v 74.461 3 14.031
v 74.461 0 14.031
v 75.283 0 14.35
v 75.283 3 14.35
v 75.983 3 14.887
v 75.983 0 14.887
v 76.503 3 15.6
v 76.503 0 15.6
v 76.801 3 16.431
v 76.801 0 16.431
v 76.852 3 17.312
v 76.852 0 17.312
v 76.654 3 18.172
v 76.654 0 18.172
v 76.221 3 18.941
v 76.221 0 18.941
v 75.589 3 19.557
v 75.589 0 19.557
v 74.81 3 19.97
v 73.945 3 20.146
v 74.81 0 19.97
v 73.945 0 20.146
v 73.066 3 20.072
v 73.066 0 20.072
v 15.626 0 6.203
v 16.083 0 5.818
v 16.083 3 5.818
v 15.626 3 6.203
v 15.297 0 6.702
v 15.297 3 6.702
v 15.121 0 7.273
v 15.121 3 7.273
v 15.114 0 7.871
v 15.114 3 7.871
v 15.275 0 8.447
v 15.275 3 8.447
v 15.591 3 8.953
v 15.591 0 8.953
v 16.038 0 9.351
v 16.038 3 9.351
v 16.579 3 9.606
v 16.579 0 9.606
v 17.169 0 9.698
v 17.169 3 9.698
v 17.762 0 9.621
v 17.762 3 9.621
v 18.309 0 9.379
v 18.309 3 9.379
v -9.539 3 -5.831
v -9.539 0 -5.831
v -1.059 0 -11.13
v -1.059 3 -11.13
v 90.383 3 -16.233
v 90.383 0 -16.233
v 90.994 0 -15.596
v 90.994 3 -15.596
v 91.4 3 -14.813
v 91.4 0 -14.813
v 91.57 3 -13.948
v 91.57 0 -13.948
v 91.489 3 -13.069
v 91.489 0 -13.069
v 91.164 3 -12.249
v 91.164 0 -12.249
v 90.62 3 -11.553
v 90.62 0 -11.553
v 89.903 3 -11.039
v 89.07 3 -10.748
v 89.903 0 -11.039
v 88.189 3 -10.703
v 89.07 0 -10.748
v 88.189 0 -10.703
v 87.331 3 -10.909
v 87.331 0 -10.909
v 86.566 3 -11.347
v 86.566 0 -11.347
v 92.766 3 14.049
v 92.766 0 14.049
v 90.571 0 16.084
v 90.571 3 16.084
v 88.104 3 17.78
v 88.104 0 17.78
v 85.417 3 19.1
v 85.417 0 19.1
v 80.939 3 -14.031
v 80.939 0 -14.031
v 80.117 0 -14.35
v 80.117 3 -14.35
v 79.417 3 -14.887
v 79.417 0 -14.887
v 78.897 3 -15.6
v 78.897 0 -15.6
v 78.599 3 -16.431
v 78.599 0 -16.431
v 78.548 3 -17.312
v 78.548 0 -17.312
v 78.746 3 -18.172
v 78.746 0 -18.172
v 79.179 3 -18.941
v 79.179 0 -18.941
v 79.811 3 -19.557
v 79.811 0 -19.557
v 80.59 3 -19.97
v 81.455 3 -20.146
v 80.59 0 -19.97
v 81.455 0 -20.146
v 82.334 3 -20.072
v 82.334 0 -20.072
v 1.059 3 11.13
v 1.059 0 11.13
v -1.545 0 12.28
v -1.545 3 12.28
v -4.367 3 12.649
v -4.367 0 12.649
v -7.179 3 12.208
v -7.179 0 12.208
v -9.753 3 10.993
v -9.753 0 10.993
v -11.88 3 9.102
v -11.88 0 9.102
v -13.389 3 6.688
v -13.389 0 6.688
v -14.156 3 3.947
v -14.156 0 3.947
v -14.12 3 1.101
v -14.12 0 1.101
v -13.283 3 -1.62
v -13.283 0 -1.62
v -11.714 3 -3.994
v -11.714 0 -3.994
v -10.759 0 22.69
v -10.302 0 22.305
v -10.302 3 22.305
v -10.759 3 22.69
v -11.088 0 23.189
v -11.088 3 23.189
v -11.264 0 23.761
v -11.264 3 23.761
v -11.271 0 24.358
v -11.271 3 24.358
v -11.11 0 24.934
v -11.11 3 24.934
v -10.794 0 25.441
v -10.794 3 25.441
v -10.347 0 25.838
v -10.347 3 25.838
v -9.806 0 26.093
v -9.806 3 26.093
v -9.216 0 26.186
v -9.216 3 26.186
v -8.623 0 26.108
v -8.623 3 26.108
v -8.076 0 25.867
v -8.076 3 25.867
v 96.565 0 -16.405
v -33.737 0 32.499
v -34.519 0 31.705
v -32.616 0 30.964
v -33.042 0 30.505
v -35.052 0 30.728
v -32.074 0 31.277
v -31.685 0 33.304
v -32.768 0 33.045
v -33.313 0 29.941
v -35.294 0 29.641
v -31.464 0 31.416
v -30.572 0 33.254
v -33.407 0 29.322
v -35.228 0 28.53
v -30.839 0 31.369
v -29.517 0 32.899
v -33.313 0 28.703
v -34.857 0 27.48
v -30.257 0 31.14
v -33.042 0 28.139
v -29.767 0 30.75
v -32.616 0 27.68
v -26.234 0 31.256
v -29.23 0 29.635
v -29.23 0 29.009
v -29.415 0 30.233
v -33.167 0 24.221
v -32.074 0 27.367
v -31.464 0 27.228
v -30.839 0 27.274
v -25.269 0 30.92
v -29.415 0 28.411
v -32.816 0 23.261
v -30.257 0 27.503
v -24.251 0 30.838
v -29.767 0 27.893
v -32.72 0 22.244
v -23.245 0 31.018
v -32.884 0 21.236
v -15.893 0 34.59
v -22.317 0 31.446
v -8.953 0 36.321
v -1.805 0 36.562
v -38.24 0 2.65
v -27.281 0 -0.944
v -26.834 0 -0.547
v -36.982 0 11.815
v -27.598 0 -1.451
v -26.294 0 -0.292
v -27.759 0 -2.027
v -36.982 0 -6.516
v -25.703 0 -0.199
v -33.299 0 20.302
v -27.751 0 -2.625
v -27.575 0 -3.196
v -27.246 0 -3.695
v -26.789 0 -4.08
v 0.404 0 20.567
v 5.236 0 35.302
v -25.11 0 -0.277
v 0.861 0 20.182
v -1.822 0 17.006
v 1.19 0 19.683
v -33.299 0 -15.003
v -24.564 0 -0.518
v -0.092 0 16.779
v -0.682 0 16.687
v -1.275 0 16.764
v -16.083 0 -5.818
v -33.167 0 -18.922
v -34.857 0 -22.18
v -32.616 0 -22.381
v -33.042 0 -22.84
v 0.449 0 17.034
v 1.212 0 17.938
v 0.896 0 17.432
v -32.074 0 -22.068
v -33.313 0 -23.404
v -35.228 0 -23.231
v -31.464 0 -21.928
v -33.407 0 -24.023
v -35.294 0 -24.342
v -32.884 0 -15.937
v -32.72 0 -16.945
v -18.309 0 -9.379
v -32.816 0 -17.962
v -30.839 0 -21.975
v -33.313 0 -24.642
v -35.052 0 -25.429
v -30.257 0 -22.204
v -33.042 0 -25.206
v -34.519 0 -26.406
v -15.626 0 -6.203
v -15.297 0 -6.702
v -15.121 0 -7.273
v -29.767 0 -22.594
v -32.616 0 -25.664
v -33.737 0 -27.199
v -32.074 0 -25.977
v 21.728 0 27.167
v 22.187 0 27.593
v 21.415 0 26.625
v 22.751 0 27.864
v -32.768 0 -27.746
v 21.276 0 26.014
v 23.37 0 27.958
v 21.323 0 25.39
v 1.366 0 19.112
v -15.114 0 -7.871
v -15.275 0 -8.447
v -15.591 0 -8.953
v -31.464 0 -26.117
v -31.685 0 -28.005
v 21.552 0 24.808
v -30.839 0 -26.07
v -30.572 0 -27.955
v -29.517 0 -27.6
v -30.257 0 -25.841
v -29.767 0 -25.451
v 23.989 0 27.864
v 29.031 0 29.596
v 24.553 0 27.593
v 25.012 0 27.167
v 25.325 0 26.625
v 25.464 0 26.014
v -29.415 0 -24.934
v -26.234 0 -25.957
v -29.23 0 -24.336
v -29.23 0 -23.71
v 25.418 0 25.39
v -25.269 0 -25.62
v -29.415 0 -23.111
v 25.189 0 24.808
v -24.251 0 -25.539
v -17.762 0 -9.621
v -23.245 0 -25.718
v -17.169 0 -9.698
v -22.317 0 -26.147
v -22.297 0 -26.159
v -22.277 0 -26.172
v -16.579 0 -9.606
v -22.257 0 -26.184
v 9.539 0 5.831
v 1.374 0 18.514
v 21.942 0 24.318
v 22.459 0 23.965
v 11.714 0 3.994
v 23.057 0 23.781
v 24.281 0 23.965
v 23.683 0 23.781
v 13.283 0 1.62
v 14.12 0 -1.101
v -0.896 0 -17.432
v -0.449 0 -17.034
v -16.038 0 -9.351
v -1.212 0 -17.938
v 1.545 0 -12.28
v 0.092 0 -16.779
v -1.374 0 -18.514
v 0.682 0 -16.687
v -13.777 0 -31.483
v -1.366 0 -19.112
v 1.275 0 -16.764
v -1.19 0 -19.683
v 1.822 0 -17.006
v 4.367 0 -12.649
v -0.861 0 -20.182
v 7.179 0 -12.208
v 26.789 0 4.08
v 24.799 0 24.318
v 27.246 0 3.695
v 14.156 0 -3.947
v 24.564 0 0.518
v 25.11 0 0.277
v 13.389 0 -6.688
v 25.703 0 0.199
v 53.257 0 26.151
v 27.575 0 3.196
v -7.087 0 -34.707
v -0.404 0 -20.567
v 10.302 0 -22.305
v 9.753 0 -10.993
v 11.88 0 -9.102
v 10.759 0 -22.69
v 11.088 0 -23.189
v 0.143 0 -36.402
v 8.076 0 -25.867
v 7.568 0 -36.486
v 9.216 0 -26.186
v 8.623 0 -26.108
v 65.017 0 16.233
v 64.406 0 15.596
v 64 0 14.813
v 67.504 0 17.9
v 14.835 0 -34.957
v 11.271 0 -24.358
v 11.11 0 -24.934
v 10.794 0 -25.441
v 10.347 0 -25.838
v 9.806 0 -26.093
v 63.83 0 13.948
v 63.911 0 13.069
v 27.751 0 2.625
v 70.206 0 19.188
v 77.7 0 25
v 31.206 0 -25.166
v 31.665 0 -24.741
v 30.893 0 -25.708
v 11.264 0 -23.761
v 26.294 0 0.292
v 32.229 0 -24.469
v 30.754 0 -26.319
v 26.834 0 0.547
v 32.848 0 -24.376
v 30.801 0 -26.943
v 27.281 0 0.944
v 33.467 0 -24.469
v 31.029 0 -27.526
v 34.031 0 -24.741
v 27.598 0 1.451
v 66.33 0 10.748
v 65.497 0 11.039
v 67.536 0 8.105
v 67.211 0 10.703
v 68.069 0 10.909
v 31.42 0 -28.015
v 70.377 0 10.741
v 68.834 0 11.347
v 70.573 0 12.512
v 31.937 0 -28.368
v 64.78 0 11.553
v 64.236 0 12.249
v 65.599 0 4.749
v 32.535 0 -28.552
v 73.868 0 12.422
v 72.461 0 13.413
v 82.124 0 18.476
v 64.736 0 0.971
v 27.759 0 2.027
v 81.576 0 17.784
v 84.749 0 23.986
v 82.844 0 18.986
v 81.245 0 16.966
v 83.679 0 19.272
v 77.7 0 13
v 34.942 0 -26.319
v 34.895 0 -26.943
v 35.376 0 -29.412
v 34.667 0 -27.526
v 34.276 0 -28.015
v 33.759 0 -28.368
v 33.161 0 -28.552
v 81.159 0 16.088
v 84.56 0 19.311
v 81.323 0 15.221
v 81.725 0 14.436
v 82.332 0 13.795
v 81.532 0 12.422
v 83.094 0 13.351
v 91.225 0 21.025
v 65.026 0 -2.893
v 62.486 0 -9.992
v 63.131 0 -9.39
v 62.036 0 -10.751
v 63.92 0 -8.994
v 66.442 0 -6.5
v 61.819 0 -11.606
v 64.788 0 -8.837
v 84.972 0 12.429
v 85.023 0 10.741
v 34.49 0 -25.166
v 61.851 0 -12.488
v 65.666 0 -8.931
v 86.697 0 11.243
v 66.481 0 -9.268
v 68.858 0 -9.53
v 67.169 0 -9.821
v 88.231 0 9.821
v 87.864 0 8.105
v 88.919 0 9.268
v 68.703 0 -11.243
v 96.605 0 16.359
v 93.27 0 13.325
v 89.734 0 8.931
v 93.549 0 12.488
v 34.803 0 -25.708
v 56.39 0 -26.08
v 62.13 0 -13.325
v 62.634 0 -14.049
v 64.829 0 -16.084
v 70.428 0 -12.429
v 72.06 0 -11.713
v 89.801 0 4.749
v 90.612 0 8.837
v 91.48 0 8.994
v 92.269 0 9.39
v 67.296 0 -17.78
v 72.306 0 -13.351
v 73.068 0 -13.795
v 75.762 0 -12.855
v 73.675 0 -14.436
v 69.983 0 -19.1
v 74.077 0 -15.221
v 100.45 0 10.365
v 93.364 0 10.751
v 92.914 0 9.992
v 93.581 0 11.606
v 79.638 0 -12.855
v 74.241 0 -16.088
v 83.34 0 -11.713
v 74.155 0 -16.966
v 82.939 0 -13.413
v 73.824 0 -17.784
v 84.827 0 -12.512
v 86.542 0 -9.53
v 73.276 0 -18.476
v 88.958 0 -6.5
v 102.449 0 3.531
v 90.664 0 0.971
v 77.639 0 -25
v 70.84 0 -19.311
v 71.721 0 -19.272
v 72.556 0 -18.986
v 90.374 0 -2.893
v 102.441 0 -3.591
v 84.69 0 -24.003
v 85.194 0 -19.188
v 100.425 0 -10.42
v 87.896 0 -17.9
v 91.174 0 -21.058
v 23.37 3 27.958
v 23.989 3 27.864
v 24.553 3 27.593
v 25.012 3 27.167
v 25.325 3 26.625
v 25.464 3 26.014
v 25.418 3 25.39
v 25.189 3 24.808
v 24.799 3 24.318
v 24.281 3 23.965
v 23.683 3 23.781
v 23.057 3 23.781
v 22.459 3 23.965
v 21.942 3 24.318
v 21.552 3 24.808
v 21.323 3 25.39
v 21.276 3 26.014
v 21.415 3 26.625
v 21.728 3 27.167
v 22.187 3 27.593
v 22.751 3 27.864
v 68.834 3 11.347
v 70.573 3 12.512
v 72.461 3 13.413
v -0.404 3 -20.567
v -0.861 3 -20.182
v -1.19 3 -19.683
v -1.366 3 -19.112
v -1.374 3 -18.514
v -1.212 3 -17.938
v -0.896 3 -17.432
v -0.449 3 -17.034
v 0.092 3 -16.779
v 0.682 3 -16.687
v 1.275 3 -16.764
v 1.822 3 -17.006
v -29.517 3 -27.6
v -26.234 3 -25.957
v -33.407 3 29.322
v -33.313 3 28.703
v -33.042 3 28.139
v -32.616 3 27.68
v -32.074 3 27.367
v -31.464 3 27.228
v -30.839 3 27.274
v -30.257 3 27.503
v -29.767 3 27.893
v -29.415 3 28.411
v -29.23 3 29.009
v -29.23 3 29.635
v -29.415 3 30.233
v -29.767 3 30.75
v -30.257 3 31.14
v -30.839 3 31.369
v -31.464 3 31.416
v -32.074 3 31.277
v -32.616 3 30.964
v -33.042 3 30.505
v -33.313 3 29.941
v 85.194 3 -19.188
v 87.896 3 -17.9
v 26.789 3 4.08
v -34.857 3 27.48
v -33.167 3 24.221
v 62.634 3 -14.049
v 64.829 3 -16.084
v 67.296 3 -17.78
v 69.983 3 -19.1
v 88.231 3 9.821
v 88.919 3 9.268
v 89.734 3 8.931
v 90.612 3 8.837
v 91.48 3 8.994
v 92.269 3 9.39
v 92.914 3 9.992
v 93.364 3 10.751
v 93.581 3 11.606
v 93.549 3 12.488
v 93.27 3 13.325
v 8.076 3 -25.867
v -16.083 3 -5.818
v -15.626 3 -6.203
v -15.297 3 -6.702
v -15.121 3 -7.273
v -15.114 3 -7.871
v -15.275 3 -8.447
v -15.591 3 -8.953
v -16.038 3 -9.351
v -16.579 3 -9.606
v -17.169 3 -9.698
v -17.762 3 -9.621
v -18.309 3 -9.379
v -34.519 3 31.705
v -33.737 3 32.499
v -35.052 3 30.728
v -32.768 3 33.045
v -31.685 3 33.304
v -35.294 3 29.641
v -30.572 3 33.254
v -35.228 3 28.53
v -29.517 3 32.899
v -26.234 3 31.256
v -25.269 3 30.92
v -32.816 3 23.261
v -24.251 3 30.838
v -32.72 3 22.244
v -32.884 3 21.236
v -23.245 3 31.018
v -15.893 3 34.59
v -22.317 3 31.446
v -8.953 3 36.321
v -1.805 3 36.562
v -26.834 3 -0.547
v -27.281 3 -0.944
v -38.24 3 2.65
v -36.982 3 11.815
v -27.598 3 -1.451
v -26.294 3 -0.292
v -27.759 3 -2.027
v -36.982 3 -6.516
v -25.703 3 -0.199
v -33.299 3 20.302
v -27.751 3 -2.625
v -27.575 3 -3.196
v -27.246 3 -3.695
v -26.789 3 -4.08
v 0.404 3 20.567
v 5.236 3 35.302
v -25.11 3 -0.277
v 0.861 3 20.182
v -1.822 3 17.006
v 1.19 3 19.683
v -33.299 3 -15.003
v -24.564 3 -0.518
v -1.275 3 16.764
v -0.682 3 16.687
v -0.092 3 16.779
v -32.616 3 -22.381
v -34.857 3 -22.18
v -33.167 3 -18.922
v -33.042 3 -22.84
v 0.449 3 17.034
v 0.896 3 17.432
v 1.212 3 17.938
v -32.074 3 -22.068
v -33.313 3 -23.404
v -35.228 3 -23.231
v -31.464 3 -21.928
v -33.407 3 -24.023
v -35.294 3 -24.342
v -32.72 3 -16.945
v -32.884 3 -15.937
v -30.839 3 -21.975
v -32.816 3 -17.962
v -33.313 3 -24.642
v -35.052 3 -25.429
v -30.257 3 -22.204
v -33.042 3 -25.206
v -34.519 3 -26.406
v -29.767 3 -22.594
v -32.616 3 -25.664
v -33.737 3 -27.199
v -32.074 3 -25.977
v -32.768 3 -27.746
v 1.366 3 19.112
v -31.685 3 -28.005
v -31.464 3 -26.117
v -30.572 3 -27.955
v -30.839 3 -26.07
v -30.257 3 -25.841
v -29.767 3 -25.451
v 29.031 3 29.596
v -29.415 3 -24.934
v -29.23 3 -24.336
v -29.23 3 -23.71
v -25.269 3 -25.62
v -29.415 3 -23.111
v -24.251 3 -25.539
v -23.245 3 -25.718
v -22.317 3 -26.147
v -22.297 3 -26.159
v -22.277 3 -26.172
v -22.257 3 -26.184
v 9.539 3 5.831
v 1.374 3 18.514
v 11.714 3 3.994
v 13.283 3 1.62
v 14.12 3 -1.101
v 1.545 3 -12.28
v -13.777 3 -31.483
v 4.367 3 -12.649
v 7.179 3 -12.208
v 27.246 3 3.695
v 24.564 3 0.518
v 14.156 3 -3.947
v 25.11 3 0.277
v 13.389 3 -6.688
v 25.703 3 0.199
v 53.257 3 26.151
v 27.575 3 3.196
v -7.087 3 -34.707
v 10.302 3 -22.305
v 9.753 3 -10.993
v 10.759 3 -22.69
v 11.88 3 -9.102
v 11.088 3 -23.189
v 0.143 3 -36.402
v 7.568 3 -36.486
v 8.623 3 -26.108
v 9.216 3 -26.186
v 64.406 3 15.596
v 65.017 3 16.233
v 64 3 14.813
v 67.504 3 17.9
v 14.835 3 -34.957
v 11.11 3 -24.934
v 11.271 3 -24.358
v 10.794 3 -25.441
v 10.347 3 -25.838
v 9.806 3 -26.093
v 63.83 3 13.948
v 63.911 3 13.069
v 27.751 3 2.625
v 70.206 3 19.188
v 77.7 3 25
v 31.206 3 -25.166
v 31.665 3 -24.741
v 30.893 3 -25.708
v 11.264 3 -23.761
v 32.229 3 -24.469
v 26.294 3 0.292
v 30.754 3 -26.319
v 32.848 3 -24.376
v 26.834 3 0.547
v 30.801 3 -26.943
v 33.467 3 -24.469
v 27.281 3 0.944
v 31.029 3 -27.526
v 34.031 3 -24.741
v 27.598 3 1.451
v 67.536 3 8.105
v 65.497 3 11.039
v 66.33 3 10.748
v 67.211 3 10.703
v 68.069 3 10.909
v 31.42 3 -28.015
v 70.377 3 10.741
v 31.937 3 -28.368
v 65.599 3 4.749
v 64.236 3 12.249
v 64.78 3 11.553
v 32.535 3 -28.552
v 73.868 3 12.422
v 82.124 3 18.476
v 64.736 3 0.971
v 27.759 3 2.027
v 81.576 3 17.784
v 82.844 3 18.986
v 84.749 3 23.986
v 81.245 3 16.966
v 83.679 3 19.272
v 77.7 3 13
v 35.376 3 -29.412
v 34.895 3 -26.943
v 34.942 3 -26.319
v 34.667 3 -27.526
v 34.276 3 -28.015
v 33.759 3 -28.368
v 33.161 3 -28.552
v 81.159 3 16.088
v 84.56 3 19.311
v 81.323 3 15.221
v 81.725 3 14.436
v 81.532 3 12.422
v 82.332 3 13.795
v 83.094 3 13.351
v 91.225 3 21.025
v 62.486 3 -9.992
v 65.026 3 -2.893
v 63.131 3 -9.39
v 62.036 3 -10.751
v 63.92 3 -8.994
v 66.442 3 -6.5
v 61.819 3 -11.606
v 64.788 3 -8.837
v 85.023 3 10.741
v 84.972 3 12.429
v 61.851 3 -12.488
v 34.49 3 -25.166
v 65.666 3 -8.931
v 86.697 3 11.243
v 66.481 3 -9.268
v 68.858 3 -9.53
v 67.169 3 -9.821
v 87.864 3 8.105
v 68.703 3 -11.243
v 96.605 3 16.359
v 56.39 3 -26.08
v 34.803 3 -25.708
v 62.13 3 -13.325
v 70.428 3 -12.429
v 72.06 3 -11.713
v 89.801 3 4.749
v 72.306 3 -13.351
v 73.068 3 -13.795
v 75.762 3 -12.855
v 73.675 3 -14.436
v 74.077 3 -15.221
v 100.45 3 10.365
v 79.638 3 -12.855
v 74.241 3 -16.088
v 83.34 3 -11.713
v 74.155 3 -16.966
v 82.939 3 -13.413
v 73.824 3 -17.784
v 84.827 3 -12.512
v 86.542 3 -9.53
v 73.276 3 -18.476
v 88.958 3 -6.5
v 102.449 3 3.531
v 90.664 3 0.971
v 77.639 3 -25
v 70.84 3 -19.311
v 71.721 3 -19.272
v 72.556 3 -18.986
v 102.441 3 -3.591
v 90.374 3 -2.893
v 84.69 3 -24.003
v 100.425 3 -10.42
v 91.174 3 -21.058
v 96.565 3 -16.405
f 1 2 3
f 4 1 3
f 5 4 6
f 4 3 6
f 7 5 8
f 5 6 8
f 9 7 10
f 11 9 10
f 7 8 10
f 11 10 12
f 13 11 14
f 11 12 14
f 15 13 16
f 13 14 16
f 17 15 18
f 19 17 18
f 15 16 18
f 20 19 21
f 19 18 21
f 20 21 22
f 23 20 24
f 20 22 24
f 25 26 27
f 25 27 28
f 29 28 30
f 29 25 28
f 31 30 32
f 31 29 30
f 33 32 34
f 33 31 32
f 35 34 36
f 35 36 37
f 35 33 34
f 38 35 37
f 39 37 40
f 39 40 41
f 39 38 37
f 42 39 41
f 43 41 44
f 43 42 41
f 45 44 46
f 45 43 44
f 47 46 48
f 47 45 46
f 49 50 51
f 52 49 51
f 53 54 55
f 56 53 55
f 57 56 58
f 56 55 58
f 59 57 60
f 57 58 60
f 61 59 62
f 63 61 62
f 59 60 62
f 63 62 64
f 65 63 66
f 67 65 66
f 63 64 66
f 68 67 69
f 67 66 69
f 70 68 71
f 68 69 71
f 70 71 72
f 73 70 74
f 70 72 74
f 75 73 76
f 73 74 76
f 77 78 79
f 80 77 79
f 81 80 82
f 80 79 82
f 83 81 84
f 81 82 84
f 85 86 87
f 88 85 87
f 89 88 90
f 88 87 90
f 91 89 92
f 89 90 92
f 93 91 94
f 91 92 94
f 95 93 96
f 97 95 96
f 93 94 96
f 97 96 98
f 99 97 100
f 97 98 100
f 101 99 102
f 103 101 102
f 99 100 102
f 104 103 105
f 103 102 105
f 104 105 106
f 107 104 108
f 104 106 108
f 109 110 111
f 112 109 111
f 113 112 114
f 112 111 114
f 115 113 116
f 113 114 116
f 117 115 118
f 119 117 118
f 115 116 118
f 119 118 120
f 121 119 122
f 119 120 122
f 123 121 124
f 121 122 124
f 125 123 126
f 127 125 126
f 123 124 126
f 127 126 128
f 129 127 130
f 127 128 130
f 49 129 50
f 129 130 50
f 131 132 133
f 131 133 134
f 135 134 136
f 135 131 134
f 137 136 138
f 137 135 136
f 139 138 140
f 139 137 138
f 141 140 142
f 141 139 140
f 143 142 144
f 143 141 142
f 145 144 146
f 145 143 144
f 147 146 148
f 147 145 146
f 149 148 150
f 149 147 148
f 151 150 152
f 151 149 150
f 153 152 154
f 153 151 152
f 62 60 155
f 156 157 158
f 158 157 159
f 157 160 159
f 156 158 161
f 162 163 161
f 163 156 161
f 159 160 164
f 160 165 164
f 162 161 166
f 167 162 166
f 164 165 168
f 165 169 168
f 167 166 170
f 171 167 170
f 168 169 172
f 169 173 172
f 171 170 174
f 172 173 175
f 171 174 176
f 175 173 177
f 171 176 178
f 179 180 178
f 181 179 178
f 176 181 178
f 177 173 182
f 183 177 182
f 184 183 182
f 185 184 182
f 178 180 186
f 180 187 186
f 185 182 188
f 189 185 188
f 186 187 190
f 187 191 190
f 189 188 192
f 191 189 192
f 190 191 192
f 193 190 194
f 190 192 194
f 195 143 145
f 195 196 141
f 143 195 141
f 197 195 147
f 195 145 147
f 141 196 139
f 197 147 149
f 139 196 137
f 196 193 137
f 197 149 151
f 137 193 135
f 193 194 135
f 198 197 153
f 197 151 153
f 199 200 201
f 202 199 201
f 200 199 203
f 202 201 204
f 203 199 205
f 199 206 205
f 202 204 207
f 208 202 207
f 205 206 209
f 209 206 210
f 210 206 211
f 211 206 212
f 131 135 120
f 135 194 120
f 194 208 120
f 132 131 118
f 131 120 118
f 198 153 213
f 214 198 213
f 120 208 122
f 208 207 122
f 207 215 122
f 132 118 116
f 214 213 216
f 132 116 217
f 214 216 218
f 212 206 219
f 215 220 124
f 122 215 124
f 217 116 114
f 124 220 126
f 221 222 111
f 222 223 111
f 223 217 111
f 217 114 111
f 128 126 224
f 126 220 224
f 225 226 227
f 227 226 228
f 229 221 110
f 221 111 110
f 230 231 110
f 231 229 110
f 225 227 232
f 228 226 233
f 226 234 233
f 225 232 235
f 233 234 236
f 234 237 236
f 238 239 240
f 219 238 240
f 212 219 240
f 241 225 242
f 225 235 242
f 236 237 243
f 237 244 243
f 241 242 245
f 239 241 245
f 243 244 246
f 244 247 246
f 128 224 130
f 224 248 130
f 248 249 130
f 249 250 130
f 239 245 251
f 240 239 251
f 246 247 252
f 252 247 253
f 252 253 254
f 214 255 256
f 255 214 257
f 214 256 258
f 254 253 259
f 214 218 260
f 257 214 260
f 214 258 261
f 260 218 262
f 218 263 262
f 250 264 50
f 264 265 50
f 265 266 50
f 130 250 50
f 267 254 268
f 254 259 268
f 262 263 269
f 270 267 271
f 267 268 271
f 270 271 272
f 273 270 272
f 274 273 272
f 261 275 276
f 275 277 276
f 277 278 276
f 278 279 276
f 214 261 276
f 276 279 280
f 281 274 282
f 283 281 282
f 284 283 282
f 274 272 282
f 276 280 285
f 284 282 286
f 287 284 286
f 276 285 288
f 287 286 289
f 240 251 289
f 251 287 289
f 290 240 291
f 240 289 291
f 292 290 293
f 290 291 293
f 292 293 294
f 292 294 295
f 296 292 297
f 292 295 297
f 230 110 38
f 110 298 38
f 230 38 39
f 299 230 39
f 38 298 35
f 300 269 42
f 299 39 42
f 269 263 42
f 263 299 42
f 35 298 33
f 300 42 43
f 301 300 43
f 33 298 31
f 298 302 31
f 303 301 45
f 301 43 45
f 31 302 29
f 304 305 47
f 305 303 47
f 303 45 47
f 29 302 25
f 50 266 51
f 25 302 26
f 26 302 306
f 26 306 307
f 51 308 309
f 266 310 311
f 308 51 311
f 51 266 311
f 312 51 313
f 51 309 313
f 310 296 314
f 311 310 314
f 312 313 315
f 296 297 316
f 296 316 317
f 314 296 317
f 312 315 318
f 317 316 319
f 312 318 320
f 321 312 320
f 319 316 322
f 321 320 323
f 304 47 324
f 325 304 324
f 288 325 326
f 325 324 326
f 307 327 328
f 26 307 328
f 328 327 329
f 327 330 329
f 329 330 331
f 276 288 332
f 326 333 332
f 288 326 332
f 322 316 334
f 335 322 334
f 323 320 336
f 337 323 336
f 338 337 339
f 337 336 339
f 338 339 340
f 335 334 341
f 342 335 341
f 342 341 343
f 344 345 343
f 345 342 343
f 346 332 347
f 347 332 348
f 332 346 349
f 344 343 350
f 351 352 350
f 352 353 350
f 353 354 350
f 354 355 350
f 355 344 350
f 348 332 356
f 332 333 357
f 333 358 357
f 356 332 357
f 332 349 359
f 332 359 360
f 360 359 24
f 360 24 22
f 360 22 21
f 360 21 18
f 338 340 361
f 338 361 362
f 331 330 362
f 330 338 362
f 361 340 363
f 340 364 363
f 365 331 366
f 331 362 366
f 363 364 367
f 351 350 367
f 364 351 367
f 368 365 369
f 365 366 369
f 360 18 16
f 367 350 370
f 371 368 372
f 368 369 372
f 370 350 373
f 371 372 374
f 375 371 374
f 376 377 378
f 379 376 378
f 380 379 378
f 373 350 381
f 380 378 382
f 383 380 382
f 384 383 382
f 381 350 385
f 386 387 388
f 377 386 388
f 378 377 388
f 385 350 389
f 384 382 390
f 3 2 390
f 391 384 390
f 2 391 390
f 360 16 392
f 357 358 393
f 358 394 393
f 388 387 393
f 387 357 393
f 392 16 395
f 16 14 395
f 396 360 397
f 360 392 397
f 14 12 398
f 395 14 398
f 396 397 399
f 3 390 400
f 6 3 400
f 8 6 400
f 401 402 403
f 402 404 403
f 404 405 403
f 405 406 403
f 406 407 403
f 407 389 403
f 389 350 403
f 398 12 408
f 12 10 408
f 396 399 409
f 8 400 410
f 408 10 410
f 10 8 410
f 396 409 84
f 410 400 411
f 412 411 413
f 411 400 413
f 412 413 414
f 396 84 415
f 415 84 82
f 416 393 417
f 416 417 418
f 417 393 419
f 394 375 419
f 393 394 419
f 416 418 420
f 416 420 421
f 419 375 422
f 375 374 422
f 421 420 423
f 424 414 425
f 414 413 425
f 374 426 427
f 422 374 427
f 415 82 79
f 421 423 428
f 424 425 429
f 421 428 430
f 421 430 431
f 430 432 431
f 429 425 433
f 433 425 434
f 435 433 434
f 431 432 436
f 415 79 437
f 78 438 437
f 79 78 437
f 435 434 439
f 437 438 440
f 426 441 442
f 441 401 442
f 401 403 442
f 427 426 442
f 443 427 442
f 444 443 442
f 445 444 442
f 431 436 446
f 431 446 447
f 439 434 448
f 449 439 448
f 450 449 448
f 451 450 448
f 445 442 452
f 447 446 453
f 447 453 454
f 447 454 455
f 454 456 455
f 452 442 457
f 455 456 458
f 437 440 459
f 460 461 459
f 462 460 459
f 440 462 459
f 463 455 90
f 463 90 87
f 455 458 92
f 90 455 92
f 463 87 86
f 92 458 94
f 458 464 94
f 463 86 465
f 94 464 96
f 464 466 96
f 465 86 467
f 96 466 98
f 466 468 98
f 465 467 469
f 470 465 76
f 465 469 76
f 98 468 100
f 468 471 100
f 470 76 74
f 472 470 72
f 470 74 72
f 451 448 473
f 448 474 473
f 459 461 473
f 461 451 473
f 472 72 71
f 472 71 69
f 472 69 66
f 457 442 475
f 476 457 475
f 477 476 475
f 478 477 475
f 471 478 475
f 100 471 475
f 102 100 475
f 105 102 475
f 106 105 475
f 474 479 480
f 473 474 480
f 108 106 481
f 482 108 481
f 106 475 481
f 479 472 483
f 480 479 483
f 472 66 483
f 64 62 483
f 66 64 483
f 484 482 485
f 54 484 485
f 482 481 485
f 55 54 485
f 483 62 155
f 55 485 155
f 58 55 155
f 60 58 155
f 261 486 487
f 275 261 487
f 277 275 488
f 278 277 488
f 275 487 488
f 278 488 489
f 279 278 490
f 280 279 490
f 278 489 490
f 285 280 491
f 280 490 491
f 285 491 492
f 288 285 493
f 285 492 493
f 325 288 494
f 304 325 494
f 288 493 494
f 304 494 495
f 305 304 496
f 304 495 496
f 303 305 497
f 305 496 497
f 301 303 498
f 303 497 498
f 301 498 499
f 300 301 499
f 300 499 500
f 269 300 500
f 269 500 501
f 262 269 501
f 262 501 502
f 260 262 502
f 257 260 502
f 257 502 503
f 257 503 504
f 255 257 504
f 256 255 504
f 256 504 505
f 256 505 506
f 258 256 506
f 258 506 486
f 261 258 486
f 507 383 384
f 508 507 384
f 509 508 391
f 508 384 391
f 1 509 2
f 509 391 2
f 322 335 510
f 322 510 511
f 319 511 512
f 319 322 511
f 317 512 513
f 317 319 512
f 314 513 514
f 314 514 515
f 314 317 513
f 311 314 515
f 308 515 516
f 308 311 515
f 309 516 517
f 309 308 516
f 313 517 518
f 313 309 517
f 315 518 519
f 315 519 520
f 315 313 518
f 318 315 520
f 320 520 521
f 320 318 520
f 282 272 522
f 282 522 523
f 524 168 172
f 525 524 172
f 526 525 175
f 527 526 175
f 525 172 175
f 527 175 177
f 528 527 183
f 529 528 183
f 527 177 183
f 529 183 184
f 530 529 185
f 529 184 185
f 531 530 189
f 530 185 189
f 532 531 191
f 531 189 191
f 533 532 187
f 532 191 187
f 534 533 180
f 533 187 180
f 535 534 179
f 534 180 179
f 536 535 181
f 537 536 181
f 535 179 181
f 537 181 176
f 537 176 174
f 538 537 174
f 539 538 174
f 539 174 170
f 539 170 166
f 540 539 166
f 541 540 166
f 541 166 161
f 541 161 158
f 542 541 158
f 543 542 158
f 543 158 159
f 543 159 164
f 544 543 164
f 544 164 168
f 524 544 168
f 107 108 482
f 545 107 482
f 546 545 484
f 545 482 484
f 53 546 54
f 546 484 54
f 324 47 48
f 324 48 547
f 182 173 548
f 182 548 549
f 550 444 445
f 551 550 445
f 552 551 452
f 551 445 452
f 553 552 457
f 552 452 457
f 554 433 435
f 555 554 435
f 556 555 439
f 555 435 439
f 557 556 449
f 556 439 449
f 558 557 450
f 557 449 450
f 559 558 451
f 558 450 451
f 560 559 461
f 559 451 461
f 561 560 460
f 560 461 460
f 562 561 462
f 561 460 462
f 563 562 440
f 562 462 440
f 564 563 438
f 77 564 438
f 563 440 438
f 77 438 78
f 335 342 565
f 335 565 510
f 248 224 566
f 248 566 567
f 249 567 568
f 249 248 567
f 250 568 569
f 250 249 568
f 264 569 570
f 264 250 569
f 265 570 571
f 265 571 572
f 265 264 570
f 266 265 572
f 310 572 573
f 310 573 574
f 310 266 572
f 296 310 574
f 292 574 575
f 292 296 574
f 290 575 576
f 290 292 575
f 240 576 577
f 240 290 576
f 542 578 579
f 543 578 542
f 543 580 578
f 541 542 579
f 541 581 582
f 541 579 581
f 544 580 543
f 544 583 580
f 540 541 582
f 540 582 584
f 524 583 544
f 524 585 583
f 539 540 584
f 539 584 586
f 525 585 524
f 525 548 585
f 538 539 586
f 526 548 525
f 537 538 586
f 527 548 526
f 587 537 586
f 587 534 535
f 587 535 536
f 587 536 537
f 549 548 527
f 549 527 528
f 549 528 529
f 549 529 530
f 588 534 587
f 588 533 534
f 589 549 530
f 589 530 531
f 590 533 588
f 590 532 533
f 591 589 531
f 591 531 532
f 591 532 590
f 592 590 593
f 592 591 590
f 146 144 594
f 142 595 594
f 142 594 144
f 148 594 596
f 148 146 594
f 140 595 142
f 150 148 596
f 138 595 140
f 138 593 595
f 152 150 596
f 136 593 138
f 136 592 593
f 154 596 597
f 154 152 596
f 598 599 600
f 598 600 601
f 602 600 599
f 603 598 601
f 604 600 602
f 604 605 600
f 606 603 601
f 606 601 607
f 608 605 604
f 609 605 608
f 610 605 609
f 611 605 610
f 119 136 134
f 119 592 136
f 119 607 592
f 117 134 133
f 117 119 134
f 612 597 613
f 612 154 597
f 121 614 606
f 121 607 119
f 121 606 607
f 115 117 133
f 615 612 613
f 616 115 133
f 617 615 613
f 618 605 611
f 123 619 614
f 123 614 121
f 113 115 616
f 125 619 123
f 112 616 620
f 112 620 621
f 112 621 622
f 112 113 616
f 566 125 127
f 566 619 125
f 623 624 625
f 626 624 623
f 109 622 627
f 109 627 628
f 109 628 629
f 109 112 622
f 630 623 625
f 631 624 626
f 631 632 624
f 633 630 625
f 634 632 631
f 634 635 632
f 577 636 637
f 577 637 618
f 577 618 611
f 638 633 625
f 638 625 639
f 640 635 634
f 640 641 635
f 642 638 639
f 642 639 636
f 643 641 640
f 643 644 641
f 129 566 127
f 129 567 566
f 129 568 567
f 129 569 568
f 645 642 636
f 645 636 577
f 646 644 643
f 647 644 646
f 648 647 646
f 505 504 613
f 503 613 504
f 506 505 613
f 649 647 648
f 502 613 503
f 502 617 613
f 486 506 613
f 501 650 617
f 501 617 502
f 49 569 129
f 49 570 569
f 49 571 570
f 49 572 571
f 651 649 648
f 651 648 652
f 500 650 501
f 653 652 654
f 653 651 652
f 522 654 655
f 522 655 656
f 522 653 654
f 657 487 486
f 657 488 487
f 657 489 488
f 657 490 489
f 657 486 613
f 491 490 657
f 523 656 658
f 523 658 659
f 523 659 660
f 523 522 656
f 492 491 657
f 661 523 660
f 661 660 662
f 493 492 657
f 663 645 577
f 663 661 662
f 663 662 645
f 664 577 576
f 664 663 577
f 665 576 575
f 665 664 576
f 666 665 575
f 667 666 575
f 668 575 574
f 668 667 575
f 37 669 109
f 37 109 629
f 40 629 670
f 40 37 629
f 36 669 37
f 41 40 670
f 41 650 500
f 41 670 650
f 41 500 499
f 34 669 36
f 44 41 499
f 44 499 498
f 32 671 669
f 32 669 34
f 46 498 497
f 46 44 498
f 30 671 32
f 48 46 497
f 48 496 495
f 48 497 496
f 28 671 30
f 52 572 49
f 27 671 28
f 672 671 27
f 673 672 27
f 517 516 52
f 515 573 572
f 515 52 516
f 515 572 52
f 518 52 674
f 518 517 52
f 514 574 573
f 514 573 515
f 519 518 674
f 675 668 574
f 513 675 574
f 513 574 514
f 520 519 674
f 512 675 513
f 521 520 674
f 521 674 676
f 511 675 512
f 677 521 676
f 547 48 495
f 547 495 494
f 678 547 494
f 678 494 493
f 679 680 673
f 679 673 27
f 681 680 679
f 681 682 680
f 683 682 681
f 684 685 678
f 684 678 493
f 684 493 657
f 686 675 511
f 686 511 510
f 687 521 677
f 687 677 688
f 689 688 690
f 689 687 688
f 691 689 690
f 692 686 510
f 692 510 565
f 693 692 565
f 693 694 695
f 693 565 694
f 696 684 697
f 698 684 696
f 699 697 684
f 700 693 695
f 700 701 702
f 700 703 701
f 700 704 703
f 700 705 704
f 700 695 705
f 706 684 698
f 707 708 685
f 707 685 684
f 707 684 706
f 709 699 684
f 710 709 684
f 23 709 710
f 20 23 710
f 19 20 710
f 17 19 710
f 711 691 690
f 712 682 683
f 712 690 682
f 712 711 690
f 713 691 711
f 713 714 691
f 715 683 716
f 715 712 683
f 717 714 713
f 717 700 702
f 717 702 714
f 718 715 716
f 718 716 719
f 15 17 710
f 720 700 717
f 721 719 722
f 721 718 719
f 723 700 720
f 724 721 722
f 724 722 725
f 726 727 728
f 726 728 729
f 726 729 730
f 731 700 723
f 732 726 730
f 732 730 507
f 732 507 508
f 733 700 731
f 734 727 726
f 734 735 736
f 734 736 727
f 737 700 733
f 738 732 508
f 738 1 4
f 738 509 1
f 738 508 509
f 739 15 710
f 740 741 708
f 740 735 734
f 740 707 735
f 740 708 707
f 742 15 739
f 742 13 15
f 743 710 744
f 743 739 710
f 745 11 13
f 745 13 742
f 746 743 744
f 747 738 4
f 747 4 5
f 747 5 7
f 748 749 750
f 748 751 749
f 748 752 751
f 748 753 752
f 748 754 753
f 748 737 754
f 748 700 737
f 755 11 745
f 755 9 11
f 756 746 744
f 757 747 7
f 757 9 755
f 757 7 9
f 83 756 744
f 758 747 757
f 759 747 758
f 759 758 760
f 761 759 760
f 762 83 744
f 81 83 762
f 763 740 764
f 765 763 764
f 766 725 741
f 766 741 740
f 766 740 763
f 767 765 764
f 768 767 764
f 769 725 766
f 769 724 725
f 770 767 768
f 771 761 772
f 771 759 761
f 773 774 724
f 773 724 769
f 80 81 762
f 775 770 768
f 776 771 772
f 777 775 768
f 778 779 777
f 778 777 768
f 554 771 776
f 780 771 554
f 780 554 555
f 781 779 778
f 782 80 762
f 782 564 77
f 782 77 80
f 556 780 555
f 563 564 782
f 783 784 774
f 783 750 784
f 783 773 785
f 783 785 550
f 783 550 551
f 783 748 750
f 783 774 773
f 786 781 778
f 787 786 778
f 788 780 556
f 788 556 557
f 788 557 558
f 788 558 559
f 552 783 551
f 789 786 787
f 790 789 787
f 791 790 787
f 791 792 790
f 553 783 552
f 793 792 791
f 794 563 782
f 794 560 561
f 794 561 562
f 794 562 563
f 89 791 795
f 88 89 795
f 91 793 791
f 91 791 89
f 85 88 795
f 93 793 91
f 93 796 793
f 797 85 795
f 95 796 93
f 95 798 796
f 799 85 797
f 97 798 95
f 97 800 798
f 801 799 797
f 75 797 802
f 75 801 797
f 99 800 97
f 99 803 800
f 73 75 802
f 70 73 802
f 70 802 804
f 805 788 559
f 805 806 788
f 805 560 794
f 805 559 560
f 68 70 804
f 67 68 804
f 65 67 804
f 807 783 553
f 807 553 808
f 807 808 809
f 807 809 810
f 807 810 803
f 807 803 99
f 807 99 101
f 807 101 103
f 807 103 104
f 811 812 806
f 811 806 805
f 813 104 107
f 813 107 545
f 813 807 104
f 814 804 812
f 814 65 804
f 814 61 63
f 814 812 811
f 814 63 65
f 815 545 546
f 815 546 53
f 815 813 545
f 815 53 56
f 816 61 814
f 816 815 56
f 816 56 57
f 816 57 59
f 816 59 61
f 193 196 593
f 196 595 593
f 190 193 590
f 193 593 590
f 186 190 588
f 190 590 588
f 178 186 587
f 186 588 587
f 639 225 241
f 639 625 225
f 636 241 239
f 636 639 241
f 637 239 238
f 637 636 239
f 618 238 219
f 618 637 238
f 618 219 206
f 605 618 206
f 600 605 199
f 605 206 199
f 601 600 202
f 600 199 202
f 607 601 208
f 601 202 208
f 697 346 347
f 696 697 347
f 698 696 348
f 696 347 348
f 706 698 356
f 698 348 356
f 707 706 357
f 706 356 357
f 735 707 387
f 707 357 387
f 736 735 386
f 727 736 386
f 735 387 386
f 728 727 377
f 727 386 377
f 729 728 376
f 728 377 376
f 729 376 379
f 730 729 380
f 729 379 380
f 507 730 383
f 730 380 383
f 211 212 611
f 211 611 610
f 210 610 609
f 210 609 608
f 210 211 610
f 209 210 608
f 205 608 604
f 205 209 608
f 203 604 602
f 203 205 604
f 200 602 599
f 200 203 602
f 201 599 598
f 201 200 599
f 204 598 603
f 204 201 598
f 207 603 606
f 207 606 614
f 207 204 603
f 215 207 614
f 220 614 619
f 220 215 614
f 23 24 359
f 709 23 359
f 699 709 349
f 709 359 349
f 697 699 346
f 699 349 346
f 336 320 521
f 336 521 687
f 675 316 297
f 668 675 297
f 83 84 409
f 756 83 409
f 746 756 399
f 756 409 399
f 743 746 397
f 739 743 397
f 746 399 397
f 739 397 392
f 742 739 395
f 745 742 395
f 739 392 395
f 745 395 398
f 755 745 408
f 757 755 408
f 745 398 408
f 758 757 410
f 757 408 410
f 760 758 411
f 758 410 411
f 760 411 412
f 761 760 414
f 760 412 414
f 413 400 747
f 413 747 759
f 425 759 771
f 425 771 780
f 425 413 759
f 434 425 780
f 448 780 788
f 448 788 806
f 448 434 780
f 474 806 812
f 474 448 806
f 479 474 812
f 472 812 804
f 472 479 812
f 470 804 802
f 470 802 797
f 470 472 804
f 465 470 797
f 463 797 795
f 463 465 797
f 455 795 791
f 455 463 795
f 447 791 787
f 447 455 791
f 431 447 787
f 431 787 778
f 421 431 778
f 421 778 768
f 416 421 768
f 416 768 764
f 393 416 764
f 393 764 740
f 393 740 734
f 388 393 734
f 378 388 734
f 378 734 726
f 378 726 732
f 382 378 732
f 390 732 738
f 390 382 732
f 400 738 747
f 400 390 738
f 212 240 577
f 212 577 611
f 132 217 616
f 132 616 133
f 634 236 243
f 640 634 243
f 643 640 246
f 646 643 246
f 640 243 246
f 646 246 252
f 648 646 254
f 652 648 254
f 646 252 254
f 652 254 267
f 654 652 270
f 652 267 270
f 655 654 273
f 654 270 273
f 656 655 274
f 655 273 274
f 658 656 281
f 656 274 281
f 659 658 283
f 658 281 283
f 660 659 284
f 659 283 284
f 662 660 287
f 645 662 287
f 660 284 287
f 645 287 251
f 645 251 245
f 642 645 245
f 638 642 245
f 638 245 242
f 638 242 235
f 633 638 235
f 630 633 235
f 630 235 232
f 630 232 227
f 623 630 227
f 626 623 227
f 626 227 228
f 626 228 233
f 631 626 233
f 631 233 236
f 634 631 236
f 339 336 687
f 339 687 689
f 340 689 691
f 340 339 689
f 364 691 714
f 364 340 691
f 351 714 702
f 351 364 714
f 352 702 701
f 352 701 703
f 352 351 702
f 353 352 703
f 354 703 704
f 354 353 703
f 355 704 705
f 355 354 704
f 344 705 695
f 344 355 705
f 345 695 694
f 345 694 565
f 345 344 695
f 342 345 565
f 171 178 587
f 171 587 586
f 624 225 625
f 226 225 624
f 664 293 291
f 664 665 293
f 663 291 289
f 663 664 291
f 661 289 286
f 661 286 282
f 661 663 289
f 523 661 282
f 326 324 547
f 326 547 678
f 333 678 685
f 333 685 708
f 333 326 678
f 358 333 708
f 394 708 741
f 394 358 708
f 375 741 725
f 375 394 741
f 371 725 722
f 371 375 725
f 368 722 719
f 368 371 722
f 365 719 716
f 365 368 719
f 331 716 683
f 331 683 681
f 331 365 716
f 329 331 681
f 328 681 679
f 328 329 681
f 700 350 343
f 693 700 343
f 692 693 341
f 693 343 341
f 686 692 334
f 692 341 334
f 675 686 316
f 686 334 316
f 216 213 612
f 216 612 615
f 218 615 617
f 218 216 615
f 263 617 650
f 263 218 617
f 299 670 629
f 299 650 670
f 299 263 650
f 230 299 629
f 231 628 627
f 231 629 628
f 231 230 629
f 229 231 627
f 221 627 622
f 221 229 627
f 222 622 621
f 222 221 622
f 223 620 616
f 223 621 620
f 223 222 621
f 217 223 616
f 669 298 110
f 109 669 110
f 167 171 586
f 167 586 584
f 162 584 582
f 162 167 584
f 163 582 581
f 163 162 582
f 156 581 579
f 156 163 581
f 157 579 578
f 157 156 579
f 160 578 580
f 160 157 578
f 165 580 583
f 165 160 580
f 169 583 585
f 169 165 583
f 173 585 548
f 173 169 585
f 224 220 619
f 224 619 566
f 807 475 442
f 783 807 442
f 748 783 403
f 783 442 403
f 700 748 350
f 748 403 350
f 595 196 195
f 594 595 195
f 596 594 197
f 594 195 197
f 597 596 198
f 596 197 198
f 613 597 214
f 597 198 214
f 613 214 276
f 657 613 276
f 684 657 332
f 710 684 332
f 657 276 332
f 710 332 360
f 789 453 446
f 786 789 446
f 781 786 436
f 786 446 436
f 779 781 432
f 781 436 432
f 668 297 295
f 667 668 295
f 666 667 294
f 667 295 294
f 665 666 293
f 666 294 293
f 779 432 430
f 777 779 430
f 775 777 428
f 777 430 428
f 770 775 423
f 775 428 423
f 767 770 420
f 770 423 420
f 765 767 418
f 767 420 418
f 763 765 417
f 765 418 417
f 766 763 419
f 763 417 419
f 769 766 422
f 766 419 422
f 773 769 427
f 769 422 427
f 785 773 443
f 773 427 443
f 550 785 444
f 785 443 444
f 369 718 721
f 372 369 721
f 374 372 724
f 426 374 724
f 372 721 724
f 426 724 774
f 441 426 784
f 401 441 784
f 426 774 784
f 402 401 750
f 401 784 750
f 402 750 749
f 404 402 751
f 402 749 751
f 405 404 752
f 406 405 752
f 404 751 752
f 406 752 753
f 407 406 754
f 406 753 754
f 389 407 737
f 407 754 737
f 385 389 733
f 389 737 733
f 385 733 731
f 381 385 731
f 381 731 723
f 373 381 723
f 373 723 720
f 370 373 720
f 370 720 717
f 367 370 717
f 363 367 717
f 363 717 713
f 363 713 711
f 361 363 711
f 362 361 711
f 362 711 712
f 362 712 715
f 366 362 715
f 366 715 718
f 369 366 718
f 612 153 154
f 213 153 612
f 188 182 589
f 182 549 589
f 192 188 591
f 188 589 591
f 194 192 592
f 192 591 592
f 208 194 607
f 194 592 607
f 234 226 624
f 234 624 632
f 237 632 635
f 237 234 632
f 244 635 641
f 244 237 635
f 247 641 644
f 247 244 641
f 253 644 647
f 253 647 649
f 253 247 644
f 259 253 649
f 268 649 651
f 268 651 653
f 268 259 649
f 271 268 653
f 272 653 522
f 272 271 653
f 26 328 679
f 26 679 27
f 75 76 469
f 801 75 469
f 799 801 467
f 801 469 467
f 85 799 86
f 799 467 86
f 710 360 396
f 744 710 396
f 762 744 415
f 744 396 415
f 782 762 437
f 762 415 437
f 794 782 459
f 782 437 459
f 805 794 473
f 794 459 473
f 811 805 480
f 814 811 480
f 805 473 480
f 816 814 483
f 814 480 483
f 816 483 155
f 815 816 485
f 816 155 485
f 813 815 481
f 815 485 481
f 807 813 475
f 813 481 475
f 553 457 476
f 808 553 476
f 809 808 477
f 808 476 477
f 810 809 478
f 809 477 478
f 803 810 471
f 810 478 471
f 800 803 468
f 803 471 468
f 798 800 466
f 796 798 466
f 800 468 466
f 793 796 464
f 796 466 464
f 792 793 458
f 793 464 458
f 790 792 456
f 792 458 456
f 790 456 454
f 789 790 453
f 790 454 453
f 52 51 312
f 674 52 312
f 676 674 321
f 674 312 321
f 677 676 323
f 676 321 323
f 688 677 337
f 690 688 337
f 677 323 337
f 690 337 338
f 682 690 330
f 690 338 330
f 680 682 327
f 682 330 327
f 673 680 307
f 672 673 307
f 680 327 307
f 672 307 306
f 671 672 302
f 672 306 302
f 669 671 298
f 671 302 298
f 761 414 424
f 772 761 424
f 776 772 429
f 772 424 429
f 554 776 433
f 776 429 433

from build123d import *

# Parameters (mm, degrees)
SKETCH_2_R               = 13
EXTRUDE_1_DEPTH          = 3
CUT_EXTRUDE_2_DEPTH      = 110.084751045
PATTERN_CURVE_1_DEPTH    = 3
CUT_EXTRUDE_4_DEPTH      = 110.084751045
PATTERN_CIRCULAR_1_COUNT = 6
EXTRUDE_2_DEPTH          = 3
HOLE_WIZARD_M4_1_D       = 4.2
FILLET_1_R               = 4
SKETCH1_R                = 2.1
CUT_EXTRUDE1_DEPTH       = 110.084751045


# Read off the part's stored shape, not the designer's step: 곡선 패턴1
with BuildPart() as part:
    # 스케치2 → 보스-돌출1 (new body)
    with BuildSketch(Plane(origin=(0, 0, 0), x_dir=(1, 0, 0), z_dir=(0, 1, 0))):
        with BuildLine():
            ThreePointArc((77.639466647, 24.999926714), (45.838842968, 27.466341176), (14.834721753, 34.956824097))
            ThreePointArc((14.834721753, 34.956824097), (0.14257607, 36.40176879), (-13.777014503, 31.48323159))
            Line((-13.777014503, 31.48323159), (-22.257495465, 26.184038948))
            ThreePointArc((-22.257495465, 26.184038948), (-35.278632699, -16.528292532), (5.235906124, -35.302354942))
            ThreePointArc((5.235906124, -35.302354942), (41.103608721, -27.588473828), (77.7, -25))
            ThreePointArc((77.7, -25), (102.699981679, 0.030266699), (77.639466647, 24.999926714))
        make_face()
        with BuildLine():
            Line((-9.539433123, 5.83088464), (-1.058952162, 11.130077283))
            ThreePointArc((-1.058952162, 11.130077283), (12.720721442, 7.948788963), (9.539433123, -5.83088464))
            Line((9.539433123, -5.83088464), (1.058952162, -11.130077283))
            ThreePointArc((1.058952162, -11.130077283), (-12.720721442, -7.948788963), (-9.539433123, 5.83088464))
        make_face(mode=Mode.SUBTRACT)
        with Locations(Location((77.7, 0, 0), (0, 0, 270))):
            Circle(SKETCH_2_R, mode=Mode.SUBTRACT)
    extrude(amount=EXTRUDE_1_DEPTH)

    # 스케치4 → 컷-돌출2 (cut, through all)
    with BuildSketch(Plane(origin=(0, 0, 0), x_dir=(-1, 0, 0), z_dir=(0, -1, 0))):
        with BuildLine():
            Line((1.82151317, -17.005644102), (10.301994131, -22.304836745))
            ThreePointArc((10.301994131, -22.304836745), (10.970064678, -25.198568201), (8.076333221, -25.866638748))
            Line((8.076333221, -25.866638748), (-0.40414774, -20.567446106))
            ThreePointArc((-0.40414774, -20.567446106), (-1.072218287, -17.673714649), (1.82151317, -17.005644102))
        make_face()
    extrude(amount=-CUT_EXTRUDE_2_DEPTH, mode=Mode.SUBTRACT)

    # 곡선 패턴1 outline → 곡선 패턴1 (cut)
    with BuildSketch(Plane(origin=(0, 0, 0), x_dir=(1, 0, 0), z_dir=(0, 1, 0))):
        with BuildLine():
            Line((24.563551451, -0.518425872), (16.08307049, -5.817618515))
            ThreePointArc((16.08307049, -5.817618515), (15.414999943, -8.711349971), (18.308731399, -9.379420519))
            Line((18.308731399, -9.379420519), (26.789212361, -4.080227876))
            ThreePointArc((26.789212361, -4.080227876), (27.457282908, -1.186496419), (24.563551451, -0.518425872))
        make_face()
        with BuildLine():
            ThreePointArc((-16.08307049, 5.817618515), (-15.414999943, 8.711349971), (-18.308731399, 9.379420519))
            Line((-18.308731399, 9.379420519), (-26.789212361, 4.080227876))
            ThreePointArc((-26.789212361, 4.080227876), (-27.457282908, 1.186496419), (-24.563551451, 0.518425872))
            Line((-24.563551451, 0.518425872), (-16.08307049, 5.817618515))
        make_face()
        with BuildLine():
            Line((8.076333221, 25.866638748), (-0.40414774, 20.567446106))
            ThreePointArc((-0.40414774, 20.567446106), (-1.072218287, 17.673714649), (1.82151317, 17.005644102))
            Line((1.82151317, 17.005644102), (10.301994131, 22.304836745))
            ThreePointArc((10.301994131, 22.304836745), (10.970064678, 25.198568202), (8.076333221, 25.866638748))
        make_face()
    extrude(amount=PATTERN_CURVE_1_DEPTH, mode=Mode.SUBTRACT)

    # 스케치5 → 컷-돌출4 (cut, through all)
    with BuildSketch(Plane(origin=(0, 0, 0), x_dir=(-1, 0, 0), z_dir=(0, -1, 0))):
        with BuildLine():
            ThreePointArc((-73.066008281, -20.072023335), (-68.831471406, -18.593256858), (-65.017373608, -16.233021524))
            ThreePointArc((-65.017373608, -16.233021524), (-64.483090846, -11.881637615), (-68.834474755, -11.347354852))
            ThreePointArc((-68.834474755, -11.347354852), (-71.500640206, -12.997228095), (-74.460704817, -14.030928933))
            ThreePointArc((-74.460704817, -14.030928933), (-76.78390375, -17.748824402), (-73.066008281, -20.072023335))
        make_face()
    cut_extrude_4 = extrude(amount=-CUT_EXTRUDE_4_DEPTH, mode=Mode.SUBTRACT)

    # 원형 패턴1: 컷-돌출4 ×6 about axis, 2 skipped
    pattern_circular_1_axis = Axis((77.7, 3, 0), (0, -1, 0))
    add([cut_extrude_4.rotate(pattern_circular_1_axis, i * 360 / PATTERN_CIRCULAR_1_COUNT) for i in range(1, PATTERN_CIRCULAR_1_COUNT) if i not in (1, 4)], mode=Mode.SUBTRACT)

    # 스케치7 → 보스-돌출2 (add)
    with BuildSketch(Plane.XZ):
        with BuildLine():
            ThreePointArc((-34.857379721, -22.180465117), (-34.155886305, -26.830127811), (-29.517020915, -27.599792717))
            Line((-29.517020915, -27.599792717), (-24.147285754, -24.913232788))
            ThreePointArc((-24.147285754, -24.913232788), (-28.457668053, -21.214942262), (-32.092293027, -16.850741341))
            Line((-32.092293027, -16.850741341), (-34.857379721, -22.180465117))
        make_face()
        with BuildLine():
            ThreePointArc((-29.517020915, 32.898985359), (-34.155886305, 32.129320453), (-34.857379721, 27.479657759))
            Line((-34.857379721, 27.479657759), (-32.092293027, 22.149933984))
            ThreePointArc((-32.092293027, 22.149933984), (-28.457668053, 26.514134904), (-24.147285754, 30.21242543))
            Line((-24.147285754, 30.21242543), (-29.517020915, 32.898985359))
        make_face()
    extrude(amount=-EXTRUDE_2_DEPTH)

    # M4 나선 코일용 탭 드릴1 (through all)
    with Locations(Plane(origin=(0, 3, 0), x_dir=(1, 0, 0), z_dir=(0, 1, 0))):
        with Locations((-31.306777179, 24.022535036), (-31.306777179, -29.321727679)):
            Hole(HOLE_WIZARD_M4_1_D / 2)

    # 필렛1
    fillet_1_edges = [part.edges().sort_by_distance(p)[0] for p in [
        (-24.147285754, 1.5, -24.913232788),
        (-32.092293027, 1.5, -16.850741341),
        (-32.092293027, 1.5, 22.149933984),
        (-24.147285754, 1.5, 30.21242543),
    ]]
    fillet(fillet_1_edges, radius=FILLET_1_R)

    # Sketch1 → Cut-Extrude1 (cut, through all)
    with BuildSketch(Plane(origin=(0, 3, 0), x_dir=(1, 0, 0), z_dir=(0, 1, 0))):
        with Locations(Location((32.847987975, 26.475635233, 0), (0, 0, 270))):
            Circle(SKETCH1_R)
        with Locations(Location((23.37032867, -25.857527018, 0), (0, 0, 270))):
            Circle(SKETCH1_R)
    extrude(amount=-CUT_EXTRUDE1_DEPTH, mode=Mode.SUBTRACT)


solid = part.part
